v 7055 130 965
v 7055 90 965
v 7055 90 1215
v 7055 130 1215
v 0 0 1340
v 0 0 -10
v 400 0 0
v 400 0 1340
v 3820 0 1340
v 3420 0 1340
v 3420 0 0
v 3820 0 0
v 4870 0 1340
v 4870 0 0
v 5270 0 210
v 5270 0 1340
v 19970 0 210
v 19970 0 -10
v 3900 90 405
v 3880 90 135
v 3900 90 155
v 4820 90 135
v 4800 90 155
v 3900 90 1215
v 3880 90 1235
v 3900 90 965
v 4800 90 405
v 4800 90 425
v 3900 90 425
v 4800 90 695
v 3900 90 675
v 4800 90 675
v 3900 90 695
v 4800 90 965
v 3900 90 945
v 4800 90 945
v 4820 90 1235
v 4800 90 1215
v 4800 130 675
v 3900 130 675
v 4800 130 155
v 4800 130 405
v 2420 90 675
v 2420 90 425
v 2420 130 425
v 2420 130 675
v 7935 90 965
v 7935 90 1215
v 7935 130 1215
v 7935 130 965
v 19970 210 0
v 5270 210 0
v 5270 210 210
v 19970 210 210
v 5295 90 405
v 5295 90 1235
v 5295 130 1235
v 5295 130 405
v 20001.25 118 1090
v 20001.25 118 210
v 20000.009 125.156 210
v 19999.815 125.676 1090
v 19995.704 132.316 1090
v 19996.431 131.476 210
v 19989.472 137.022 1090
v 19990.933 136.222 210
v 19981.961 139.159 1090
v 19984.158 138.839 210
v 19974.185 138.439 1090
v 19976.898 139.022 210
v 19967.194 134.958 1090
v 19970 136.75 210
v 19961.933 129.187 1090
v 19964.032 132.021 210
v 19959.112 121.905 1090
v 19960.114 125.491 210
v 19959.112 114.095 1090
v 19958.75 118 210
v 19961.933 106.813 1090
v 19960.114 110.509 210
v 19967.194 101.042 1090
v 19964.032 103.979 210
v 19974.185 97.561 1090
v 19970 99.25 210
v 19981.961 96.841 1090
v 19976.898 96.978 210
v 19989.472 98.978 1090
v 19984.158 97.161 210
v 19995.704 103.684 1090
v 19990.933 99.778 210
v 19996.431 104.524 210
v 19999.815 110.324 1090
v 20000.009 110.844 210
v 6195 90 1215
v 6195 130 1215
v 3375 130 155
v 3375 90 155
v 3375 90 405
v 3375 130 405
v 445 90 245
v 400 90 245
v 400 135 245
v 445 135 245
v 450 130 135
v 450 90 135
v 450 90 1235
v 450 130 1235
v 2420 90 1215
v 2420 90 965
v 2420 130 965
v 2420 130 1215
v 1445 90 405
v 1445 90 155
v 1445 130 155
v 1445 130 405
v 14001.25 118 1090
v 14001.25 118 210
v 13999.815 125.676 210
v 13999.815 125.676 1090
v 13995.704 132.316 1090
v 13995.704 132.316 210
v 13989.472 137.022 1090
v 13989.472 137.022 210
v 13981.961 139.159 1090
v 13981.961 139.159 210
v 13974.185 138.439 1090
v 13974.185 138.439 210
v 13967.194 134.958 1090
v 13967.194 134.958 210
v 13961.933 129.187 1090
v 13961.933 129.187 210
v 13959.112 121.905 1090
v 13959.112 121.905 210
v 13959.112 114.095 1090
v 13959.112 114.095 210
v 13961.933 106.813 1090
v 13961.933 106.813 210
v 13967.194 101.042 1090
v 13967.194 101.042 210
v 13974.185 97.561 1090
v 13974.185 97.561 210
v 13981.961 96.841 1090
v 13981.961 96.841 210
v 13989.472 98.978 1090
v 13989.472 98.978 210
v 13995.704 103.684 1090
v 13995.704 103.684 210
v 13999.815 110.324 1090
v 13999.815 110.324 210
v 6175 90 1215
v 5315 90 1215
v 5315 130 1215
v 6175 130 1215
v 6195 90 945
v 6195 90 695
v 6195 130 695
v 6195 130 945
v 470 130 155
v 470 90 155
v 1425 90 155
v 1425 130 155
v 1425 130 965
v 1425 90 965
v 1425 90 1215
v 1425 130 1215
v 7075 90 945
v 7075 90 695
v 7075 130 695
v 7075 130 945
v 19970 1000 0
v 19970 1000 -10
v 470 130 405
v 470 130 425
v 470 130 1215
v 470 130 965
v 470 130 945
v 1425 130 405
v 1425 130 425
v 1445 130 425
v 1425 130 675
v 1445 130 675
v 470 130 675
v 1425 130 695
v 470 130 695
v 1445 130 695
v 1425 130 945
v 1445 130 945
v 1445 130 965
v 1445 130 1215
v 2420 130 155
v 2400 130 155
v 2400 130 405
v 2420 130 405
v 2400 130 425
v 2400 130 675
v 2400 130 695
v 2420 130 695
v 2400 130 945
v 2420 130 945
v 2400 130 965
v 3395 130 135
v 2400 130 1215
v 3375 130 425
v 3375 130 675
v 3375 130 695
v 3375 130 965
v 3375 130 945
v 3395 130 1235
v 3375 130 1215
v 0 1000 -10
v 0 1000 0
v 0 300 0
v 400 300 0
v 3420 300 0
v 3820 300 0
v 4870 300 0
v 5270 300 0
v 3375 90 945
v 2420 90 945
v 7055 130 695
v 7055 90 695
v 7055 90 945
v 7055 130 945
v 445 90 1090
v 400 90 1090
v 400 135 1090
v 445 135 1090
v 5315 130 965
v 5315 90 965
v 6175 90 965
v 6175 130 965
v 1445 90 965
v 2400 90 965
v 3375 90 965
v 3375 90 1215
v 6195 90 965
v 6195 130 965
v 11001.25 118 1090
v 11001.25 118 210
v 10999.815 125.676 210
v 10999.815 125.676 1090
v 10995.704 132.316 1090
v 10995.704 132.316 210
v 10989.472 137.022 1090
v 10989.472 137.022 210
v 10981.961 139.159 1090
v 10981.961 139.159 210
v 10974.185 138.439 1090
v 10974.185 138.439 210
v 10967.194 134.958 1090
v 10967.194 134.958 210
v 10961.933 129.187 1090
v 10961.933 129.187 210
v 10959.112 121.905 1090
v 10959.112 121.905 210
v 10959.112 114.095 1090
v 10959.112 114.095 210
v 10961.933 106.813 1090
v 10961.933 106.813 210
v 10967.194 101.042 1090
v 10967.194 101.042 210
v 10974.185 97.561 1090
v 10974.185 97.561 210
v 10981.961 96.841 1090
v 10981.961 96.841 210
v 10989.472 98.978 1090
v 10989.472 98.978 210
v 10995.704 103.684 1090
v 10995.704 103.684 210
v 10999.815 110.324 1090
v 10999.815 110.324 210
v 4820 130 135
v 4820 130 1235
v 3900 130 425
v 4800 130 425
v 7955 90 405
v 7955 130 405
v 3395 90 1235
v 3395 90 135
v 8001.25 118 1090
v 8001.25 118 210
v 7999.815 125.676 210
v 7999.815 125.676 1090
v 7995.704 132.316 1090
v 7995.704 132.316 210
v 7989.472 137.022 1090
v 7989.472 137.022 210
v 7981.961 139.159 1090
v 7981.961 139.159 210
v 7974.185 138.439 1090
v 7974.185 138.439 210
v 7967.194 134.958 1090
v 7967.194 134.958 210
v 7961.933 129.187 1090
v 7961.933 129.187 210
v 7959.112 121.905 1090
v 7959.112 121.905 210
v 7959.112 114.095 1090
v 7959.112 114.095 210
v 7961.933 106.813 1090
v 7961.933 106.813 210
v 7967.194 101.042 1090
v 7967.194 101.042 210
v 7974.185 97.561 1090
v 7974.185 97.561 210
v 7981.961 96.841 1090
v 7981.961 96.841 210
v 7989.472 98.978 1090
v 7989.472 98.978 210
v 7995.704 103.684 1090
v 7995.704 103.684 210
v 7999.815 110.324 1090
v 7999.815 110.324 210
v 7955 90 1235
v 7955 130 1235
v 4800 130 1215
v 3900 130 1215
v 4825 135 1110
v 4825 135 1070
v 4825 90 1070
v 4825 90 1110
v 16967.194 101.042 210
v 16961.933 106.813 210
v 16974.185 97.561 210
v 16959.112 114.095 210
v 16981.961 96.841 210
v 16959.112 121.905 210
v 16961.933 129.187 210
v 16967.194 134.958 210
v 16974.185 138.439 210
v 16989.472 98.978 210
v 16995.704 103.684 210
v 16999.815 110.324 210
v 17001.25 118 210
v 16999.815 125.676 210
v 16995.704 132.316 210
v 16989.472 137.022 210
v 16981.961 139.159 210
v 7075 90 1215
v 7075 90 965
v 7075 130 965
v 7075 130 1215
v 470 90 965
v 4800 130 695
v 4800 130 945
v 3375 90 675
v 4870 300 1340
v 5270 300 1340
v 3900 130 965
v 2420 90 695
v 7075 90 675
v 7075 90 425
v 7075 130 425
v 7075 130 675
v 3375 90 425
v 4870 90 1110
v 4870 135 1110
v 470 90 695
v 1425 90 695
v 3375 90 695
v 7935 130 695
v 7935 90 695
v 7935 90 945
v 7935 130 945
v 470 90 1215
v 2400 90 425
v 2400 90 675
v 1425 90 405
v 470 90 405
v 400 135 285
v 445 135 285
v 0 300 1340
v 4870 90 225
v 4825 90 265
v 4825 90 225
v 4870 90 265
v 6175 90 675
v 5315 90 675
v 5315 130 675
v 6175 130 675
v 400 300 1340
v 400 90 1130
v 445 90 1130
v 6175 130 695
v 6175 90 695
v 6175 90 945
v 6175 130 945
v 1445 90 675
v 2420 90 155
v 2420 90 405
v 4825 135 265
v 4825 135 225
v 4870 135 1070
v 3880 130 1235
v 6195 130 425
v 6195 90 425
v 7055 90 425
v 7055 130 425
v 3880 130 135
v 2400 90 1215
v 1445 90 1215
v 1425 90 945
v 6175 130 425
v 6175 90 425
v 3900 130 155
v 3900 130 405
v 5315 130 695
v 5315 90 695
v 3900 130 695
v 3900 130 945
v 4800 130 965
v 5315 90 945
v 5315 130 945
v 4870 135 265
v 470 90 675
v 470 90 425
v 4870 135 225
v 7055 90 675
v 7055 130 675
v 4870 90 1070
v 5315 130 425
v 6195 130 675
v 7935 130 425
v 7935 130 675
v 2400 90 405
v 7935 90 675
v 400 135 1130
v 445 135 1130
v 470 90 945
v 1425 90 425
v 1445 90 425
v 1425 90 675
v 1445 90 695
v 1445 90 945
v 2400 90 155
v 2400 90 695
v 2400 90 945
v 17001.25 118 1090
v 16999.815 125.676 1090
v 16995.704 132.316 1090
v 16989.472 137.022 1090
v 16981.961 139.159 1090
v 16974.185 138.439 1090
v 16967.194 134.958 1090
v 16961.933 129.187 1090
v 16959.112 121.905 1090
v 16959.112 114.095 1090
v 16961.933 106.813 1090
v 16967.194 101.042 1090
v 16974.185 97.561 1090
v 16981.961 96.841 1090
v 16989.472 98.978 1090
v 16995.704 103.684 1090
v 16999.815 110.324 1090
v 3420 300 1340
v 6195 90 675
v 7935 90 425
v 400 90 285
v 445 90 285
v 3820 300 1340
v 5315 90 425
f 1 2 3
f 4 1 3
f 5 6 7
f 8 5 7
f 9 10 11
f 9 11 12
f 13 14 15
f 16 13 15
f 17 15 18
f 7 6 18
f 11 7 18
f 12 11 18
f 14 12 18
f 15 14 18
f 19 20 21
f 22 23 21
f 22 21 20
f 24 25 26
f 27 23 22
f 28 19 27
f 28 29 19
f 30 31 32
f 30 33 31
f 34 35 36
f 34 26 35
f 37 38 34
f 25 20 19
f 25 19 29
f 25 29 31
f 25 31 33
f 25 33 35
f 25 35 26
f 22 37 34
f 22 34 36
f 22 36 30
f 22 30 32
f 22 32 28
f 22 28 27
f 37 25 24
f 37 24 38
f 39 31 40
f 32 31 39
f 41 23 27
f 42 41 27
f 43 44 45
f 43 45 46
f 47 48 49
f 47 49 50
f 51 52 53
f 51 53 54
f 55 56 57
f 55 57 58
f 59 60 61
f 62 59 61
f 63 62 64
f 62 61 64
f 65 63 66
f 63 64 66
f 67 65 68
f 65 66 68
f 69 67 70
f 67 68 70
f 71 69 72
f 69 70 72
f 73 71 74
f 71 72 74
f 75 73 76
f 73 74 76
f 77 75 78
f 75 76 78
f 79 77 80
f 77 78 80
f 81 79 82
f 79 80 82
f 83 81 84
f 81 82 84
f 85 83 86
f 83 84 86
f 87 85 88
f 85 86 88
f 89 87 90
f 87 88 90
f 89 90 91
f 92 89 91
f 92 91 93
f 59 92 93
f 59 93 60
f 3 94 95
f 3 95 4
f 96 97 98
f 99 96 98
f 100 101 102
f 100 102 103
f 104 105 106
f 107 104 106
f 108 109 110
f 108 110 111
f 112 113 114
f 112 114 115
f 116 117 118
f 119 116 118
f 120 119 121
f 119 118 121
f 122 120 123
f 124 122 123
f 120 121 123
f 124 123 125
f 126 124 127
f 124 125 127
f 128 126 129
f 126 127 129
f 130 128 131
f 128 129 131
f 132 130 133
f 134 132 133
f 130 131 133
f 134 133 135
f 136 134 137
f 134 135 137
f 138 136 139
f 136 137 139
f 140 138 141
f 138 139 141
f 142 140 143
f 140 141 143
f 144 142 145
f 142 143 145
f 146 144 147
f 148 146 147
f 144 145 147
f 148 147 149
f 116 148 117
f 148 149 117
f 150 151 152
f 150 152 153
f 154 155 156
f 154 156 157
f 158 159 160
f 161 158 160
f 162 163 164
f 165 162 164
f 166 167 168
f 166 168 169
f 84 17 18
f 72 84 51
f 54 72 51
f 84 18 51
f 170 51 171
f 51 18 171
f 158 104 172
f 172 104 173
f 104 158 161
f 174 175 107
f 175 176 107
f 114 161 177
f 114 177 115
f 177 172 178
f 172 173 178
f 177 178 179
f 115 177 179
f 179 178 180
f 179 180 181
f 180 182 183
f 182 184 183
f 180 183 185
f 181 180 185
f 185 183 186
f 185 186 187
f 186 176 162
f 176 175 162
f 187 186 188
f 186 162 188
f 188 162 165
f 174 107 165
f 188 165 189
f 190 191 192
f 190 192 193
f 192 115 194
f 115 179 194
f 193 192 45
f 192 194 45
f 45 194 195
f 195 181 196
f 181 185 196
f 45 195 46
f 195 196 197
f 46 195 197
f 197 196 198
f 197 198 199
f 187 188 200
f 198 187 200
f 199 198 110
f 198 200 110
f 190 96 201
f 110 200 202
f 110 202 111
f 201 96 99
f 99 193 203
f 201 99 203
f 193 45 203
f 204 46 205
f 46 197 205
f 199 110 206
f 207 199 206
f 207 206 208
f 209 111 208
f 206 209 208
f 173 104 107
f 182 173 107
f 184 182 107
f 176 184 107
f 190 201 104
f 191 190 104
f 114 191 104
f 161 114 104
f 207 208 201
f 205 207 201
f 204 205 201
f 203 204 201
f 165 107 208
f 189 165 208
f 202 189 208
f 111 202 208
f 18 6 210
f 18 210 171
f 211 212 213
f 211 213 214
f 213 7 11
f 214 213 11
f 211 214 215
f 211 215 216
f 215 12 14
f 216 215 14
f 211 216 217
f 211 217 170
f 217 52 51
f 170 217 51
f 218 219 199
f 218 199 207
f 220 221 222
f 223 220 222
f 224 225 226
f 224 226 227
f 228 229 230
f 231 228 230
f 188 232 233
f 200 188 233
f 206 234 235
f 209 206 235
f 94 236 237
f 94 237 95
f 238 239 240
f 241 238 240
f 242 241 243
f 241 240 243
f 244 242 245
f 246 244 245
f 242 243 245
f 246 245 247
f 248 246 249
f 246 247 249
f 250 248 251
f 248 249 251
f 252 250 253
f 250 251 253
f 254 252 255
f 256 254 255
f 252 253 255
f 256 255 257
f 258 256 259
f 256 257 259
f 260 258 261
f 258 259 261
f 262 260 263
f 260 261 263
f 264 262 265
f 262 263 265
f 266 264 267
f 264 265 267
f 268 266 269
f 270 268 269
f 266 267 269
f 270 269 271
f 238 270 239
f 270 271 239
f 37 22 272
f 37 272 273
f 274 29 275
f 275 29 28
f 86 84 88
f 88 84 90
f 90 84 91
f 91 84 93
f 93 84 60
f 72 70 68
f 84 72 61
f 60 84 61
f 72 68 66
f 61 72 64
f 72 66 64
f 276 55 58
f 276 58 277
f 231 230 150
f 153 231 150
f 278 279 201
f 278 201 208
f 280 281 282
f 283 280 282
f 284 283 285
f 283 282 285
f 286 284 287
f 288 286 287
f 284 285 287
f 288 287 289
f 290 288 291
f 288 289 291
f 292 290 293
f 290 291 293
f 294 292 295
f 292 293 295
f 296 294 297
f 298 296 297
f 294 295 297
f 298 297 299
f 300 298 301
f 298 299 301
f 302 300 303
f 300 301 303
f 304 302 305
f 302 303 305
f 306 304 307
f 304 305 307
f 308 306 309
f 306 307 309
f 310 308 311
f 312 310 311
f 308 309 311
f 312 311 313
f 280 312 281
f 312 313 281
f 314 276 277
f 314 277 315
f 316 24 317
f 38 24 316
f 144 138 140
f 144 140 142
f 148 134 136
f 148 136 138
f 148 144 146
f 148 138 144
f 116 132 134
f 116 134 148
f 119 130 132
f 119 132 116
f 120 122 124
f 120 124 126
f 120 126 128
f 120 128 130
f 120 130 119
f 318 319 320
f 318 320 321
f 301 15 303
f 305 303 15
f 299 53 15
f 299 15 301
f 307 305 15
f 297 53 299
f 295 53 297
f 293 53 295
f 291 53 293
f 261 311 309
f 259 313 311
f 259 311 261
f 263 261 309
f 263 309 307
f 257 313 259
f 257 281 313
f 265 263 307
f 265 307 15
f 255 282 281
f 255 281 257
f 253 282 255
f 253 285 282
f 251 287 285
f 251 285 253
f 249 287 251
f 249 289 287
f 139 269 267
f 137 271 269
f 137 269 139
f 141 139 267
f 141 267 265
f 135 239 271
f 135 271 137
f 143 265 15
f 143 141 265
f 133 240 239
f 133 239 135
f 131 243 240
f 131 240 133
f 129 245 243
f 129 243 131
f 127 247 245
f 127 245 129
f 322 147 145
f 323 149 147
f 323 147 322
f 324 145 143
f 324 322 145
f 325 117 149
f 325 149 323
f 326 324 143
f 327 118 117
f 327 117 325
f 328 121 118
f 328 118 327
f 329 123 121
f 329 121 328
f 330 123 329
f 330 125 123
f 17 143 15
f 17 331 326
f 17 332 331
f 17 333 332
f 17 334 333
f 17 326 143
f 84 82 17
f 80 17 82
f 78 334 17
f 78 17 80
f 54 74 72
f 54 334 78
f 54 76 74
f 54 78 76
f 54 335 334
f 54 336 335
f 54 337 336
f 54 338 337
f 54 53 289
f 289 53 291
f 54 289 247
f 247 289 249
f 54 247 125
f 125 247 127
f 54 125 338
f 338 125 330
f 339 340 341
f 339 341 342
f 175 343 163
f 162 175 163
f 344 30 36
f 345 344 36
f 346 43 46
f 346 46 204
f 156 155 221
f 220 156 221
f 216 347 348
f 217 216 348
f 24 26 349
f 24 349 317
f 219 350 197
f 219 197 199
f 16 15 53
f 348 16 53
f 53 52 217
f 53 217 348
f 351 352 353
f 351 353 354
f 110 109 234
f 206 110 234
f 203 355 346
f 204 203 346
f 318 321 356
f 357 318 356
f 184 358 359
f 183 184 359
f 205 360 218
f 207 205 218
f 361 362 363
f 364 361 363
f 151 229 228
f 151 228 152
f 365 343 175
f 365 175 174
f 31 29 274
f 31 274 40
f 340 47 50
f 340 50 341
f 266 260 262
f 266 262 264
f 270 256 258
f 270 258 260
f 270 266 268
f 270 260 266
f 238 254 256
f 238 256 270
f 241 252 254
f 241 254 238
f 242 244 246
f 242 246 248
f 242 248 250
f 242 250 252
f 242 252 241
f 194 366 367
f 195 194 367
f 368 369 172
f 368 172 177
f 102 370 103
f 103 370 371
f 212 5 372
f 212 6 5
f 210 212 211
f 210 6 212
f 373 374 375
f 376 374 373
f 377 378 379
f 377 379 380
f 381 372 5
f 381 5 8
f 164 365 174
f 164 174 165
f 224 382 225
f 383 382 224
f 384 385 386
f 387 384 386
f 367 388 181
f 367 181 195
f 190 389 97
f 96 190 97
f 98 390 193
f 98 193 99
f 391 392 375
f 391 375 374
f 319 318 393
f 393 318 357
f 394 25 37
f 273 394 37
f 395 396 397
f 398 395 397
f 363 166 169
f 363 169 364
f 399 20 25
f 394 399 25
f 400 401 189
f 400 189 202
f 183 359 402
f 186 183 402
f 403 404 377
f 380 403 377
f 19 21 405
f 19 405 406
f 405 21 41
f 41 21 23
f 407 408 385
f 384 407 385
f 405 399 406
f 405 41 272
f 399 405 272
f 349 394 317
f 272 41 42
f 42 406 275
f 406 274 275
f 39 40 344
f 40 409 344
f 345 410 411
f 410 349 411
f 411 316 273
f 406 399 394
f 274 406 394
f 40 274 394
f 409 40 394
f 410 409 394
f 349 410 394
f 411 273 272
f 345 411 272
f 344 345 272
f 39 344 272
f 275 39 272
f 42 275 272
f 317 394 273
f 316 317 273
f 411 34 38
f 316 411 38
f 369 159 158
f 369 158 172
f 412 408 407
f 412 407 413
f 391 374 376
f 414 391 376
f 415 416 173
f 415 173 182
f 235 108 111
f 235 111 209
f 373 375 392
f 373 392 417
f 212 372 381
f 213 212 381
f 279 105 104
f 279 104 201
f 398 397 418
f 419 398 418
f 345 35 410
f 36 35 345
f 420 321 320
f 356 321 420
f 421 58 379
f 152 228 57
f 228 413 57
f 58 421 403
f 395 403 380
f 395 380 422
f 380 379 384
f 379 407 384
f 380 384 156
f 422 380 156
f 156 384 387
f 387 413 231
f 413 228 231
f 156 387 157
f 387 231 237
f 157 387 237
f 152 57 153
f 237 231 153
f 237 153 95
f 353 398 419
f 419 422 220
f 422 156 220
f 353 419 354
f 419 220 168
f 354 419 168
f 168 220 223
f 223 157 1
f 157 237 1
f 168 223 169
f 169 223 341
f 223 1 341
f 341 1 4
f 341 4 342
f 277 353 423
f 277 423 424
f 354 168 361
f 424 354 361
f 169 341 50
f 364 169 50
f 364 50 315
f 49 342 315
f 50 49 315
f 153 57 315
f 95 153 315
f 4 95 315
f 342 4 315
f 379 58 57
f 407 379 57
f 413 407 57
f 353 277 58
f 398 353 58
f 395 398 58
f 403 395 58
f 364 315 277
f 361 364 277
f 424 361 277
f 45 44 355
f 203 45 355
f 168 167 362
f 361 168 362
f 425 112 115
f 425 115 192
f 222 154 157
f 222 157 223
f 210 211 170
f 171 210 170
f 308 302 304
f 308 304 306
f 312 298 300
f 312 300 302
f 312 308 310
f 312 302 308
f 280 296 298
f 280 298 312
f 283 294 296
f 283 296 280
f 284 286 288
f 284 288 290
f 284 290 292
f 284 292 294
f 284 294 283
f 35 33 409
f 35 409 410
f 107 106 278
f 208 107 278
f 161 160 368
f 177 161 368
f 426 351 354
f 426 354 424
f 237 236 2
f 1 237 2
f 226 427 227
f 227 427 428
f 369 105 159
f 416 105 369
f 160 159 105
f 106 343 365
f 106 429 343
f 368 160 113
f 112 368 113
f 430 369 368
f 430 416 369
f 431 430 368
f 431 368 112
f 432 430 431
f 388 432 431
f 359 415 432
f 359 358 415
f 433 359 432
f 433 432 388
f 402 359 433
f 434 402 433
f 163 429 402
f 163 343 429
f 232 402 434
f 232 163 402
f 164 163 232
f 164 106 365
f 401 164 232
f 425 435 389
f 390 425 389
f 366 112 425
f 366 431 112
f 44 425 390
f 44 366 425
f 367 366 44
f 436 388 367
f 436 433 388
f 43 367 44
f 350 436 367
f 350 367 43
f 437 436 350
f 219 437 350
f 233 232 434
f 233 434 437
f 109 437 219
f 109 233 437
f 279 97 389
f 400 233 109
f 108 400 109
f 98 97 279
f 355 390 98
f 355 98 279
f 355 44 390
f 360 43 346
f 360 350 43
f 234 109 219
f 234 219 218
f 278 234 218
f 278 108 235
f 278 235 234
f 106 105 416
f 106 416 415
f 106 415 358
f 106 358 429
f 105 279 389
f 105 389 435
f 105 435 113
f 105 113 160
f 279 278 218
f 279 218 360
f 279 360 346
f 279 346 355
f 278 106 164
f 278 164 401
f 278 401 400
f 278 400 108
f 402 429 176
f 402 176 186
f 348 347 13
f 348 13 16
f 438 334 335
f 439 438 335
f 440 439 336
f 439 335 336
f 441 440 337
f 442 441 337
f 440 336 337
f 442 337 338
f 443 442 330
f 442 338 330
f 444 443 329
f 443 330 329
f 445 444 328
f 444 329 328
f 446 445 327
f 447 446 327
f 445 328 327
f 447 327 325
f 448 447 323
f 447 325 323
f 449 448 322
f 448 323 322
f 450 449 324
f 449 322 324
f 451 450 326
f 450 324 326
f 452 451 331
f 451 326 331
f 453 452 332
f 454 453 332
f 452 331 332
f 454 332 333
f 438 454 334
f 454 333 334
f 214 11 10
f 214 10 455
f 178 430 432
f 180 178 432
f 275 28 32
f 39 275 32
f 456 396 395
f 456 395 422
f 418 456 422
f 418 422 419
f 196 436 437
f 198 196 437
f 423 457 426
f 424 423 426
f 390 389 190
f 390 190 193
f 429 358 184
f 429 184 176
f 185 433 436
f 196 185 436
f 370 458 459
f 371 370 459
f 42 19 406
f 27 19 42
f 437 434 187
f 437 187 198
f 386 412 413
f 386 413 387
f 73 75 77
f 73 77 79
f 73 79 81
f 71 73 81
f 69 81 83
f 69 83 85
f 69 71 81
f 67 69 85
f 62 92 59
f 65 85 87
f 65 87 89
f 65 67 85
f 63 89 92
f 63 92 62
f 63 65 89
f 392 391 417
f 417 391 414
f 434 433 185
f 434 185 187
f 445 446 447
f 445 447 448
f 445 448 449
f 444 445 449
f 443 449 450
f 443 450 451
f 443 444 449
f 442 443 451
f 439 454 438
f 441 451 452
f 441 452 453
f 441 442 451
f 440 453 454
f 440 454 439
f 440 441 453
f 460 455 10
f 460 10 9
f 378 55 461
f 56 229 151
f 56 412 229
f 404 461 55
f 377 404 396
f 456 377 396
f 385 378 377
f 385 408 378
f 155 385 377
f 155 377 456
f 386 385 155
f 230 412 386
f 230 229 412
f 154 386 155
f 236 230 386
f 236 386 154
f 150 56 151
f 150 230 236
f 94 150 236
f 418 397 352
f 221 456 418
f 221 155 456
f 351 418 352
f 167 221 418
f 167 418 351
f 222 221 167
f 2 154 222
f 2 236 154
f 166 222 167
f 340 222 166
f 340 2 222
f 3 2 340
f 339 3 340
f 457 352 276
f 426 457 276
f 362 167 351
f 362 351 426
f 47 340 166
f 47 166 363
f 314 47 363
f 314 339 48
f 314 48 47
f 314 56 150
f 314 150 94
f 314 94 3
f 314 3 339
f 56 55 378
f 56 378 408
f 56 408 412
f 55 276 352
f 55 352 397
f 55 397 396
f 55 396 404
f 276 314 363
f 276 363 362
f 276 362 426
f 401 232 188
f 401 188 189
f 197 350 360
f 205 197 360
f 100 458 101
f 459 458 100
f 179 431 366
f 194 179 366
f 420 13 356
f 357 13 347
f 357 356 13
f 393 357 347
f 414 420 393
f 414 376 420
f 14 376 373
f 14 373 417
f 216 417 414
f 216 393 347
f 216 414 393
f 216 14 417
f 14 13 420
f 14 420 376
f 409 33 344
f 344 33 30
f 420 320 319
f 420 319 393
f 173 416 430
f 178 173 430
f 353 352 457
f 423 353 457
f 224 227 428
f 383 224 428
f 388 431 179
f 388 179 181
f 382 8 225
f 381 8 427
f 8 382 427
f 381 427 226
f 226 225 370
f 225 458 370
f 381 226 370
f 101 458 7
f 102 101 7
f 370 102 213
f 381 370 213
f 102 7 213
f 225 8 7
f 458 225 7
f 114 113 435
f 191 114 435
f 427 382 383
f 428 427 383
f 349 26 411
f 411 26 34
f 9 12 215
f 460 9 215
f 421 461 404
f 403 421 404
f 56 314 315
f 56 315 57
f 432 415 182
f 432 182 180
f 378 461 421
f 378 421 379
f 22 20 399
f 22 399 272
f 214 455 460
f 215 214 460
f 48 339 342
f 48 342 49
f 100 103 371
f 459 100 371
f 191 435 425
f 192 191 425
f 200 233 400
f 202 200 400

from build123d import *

# Parameters (mm, degrees)
F0_W      = 19970
F0_H      = 10
F1_DEPTH  = 1000
F2_W      = 400
F2_H      = 300
F3_DEPTH  = 1340
F5_W      = 14700
F5_H      = 210
F6_DEPTH  = 210
F7_R      = 21.25
F8_DEPTH  = 880
F10_W     = 2945
F10_H     = 1100
F10_W_2   = 955
F10_H_2   = 250
F10_W_3   = 940
F10_W_4   = 900
F11_DEPTH = 40
F12_W     = 45
F12_H     = 40
F13_DEPTH = 45
F14_W     = 860
F14_H     = 250
F15_DEPTH = 40


with BuildPart() as f1:
    # F0 (on Front) → F1 (new body)
    with BuildSketch(Plane.XZ):
        with Locations((9985, -5)):
            Rectangle(F0_W, F0_H)
    extrude(amount=-F1_DEPTH)

    # F2 (on face) → F3 (join)
    with BuildSketch(Plane.XY):
        with Locations((200, 150)):
            Rectangle(F2_W, F2_H)
        with Locations((3620, 150)):
            Rectangle(F2_W, F2_H)
        with Locations((5070, 150)):
            Rectangle(F2_W, F2_H)
    extrude(amount=F3_DEPTH)

    # F5 (on face) → F6 (join)
    with BuildSketch(Plane.XY):
        with Locations((12620, 105)):
            Rectangle(F5_W, F5_H)
    extrude(amount=F6_DEPTH)

    # F7 (on face) → F8 (join)
    with BuildSketch(Plane.XY.offset(210)):
        with Locations((7980, 118)):
            Circle(F7_R)
        with Locations((10980, 118)):
            Circle(F7_R)
        with Locations((13980, 118)):
            Circle(F7_R)
        with Locations((16980, 118)):
            Circle(F7_R)
        with Locations((19980, 118)):
            Circle(F7_R)
    extrude(amount=F8_DEPTH)

    # F12 (on offset) → F13 (join)
    with BuildSketch(Plane.XZ.offset(-90)):
        with Locations((422.5, 1110)):
            Rectangle(F12_W, F12_H)
        with Locations((422.5, 265)):
            Rectangle(F12_W, F12_H)
        with Locations((4847.5, 1090)):
            Rectangle(F12_W, F12_H)
        with Locations((4847.5, 245)):
            Rectangle(F12_W, F12_H)
    extrude(amount=-F13_DEPTH)


with BuildPart() as f11:
    # F10 (on offset) → F11 (new body)
    with BuildSketch(Plane.XZ.offset(-90)):
        with Locations((1922.5, 685)):
            Rectangle(F10_W, F10_H)
        with Locations((947.5, 280)):
            Rectangle(F10_W_2, F10_H_2, mode=Mode.SUBTRACT)
        with Locations((1922.5, 280)):
            Rectangle(F10_W_2, F10_H_2, mode=Mode.SUBTRACT)
        with Locations((947.5, 550)):
            Rectangle(F10_W_2, F10_H_2, mode=Mode.SUBTRACT)
        with Locations((1922.5, 550)):
            Rectangle(F10_W_2, F10_H_2, mode=Mode.SUBTRACT)
        with Locations((2897.5, 280)):
            Rectangle(F10_W_2, F10_H_2, mode=Mode.SUBTRACT)
        with Locations((2897.5, 550)):
            Rectangle(F10_W_2, F10_H_2, mode=Mode.SUBTRACT)
        with Locations((947.5, 820)):
            Rectangle(F10_W_2, F10_H_2, mode=Mode.SUBTRACT)
        with Locations((1922.5, 820)):
            Rectangle(F10_W_2, F10_H_2, mode=Mode.SUBTRACT)
        with Locations((947.5, 1090)):
            Rectangle(F10_W_2, F10_H_2, mode=Mode.SUBTRACT)
        with Locations((1922.5, 1090)):
            Rectangle(F10_W_2, F10_H_2, mode=Mode.SUBTRACT)
        with Locations((2897.5, 820)):
            Rectangle(F10_W_2, F10_H_2, mode=Mode.SUBTRACT)
        with Locations((2897.5, 1090)):
            Rectangle(F10_W_2, F10_H_2, mode=Mode.SUBTRACT)
        with Locations((4350, 685)):
            Rectangle(F10_W_3, F10_H)
        with Locations((4350, 280)):
            Rectangle(F10_W_4, F10_H_2, mode=Mode.SUBTRACT)
        with Locations((4350, 550)):
            Rectangle(F10_W_4, F10_H_2, mode=Mode.SUBTRACT)
        with Locations((4350, 820)):
            Rectangle(F10_W_4, F10_H_2, mode=Mode.SUBTRACT)
        with Locations((4350, 1090)):
            Rectangle(F10_W_4, F10_H_2, mode=Mode.SUBTRACT)
    extrude(amount=-F11_DEPTH)


with BuildPart() as f15:
    # F14 (on offset) → F15 (new body)
    with BuildSketch(Plane.XZ.offset(-90)):
        Polygon((7955, 1235), (5295, 1235), (5295, 405), (5703.985691, 405), (7955, 405), align=None)
        with Locations((5745, 550)):
            Rectangle(F14_W, F14_H, mode=Mode.SUBTRACT)
        with Locations((6625, 550)):
            Rectangle(F14_W, F14_H, mode=Mode.SUBTRACT)
        with Locations((7505, 550)):
            Rectangle(F14_W, F14_H, mode=Mode.SUBTRACT)
        with Locations((5745, 820)):
            Rectangle(F14_W, F14_H, mode=Mode.SUBTRACT)
        with Locations((5745, 1090)):
            Rectangle(F14_W, F14_H, mode=Mode.SUBTRACT)
        with Locations((6625, 820)):
            Rectangle(F14_W, F14_H, mode=Mode.SUBTRACT)
        with Locations((7505, 820)):
            Rectangle(F14_W, F14_H, mode=Mode.SUBTRACT)
        with Locations((6625, 1090)):
            Rectangle(F14_W, F14_H, mode=Mode.SUBTRACT)
        Polygon((7415, 1215), (7935, 1215), (7935, 965), (7075, 965), (7075, 1215), (7395, 1215), align=None, mode=Mode.SUBTRACT)
    extrude(amount=-F15_DEPTH)


solid = Compound([f1.part, f11.part, f15.part])
